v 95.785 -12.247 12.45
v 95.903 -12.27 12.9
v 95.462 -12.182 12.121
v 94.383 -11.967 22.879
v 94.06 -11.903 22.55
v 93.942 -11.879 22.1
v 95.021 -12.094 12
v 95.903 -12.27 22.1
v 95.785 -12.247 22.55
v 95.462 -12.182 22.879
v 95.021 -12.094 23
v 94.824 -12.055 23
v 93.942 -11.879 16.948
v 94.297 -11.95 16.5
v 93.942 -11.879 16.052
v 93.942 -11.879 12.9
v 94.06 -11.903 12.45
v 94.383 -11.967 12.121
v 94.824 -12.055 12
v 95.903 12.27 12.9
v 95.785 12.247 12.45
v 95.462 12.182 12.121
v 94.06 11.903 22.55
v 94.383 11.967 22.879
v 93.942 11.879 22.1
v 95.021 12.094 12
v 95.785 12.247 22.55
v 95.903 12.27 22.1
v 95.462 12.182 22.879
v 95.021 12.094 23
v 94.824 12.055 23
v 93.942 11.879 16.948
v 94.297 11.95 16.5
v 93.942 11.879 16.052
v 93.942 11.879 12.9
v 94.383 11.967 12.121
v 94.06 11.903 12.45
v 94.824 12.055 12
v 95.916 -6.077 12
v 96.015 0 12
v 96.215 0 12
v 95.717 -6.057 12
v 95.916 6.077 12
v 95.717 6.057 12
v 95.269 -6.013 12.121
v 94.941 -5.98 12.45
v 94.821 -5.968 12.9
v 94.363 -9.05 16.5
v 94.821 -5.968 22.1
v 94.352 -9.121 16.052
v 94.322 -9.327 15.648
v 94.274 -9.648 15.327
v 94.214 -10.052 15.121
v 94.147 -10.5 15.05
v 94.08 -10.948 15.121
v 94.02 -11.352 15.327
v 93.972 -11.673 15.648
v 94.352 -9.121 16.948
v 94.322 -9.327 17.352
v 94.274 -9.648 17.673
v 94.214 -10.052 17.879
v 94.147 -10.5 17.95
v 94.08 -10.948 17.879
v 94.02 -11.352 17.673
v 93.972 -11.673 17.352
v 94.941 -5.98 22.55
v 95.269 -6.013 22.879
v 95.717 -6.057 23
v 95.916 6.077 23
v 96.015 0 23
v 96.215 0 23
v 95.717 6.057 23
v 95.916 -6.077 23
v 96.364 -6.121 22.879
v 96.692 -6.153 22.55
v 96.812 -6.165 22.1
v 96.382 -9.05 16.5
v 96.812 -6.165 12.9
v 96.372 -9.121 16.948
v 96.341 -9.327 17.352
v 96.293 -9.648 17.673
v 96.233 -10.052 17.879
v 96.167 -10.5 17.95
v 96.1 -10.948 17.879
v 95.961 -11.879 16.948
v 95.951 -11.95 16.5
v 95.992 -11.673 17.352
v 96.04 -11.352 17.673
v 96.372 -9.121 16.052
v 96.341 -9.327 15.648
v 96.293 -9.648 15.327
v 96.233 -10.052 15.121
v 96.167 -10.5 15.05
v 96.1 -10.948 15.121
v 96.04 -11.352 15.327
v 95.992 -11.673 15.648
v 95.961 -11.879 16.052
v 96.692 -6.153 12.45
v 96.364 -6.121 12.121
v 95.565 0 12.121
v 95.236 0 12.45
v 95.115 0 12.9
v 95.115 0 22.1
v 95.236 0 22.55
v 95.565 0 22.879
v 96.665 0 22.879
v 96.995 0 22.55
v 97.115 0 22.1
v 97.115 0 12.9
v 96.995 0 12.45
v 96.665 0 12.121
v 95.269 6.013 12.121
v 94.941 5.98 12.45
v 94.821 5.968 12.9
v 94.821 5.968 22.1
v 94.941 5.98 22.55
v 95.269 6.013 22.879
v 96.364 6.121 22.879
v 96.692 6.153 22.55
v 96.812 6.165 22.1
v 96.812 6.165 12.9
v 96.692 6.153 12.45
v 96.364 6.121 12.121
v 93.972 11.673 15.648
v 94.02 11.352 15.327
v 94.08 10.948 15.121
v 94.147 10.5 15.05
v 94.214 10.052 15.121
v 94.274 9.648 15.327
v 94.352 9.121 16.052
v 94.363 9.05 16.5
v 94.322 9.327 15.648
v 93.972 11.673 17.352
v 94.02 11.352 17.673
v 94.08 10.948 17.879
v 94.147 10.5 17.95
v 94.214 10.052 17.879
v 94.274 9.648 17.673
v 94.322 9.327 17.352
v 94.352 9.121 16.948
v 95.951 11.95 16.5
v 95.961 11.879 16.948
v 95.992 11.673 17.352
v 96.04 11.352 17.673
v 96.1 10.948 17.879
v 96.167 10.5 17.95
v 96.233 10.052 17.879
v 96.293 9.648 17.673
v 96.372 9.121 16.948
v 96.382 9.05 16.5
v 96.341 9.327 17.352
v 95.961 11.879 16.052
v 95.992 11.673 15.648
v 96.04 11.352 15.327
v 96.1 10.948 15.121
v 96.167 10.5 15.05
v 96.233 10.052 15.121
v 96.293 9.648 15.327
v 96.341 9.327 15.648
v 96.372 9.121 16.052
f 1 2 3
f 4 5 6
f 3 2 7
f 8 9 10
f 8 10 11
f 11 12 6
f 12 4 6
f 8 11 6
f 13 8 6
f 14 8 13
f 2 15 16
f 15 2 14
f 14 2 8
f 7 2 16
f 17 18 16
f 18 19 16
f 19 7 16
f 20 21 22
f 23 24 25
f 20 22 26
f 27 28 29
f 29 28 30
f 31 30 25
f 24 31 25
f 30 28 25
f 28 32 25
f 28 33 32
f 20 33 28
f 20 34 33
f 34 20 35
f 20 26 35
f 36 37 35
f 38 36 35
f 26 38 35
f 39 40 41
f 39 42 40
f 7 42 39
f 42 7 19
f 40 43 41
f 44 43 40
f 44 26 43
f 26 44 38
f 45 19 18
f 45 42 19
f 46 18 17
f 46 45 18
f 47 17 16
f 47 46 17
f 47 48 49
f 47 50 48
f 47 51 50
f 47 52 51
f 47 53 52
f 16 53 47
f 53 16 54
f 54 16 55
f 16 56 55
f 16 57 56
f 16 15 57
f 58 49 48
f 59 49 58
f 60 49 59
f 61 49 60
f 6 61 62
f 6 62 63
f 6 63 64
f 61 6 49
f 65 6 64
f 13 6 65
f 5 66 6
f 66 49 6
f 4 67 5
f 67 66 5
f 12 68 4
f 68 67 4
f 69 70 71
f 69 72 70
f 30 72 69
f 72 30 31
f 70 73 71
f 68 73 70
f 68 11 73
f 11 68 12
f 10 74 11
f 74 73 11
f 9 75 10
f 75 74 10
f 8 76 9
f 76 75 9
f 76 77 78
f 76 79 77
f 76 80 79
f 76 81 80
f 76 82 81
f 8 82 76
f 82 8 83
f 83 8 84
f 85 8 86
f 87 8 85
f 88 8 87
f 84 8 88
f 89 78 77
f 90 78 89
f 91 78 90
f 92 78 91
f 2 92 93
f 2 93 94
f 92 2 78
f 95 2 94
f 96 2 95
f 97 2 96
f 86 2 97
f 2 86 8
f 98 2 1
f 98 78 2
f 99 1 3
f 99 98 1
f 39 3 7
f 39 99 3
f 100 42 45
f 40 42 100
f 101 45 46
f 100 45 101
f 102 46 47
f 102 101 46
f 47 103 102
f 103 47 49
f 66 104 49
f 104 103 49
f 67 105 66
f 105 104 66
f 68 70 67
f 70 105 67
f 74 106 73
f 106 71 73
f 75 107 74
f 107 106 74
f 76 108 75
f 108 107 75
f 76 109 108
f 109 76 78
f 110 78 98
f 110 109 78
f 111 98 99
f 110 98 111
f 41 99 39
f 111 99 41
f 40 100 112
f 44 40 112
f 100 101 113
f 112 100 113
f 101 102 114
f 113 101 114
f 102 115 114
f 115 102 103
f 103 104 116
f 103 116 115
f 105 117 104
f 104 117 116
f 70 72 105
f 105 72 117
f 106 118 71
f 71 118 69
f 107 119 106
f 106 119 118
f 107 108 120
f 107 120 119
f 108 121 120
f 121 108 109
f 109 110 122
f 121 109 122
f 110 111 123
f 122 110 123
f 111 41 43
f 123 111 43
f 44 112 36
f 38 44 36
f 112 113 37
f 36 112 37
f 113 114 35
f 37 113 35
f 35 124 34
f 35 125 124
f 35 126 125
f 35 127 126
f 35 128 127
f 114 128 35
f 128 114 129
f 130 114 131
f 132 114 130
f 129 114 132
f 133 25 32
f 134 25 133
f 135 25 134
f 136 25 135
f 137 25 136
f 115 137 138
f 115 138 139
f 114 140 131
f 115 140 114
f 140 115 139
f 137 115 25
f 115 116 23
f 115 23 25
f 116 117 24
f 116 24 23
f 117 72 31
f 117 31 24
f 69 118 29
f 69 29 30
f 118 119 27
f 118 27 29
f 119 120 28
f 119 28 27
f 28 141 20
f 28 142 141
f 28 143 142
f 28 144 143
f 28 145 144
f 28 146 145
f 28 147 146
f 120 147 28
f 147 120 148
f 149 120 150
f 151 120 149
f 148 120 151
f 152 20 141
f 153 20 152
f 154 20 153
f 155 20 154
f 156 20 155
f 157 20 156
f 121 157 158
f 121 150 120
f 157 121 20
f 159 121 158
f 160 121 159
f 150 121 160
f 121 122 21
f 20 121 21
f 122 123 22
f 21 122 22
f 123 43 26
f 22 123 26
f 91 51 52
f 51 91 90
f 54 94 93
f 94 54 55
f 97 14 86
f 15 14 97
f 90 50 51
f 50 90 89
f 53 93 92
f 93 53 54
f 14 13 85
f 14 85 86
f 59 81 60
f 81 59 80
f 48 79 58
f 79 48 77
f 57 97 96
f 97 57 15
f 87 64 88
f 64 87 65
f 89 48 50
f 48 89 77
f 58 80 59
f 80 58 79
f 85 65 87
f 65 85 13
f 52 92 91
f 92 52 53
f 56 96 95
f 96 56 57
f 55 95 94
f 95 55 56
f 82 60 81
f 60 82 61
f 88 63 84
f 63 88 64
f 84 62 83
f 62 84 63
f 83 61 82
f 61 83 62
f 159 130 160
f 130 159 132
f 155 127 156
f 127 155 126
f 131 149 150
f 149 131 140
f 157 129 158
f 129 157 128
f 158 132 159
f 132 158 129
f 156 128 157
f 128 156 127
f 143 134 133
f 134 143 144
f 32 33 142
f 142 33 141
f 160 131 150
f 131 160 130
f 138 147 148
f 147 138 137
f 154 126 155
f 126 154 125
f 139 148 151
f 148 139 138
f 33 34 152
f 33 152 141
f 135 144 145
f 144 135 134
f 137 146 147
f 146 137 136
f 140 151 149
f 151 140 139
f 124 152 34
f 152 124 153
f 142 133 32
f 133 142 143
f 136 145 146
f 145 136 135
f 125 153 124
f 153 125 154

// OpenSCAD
// H14_trigger_plate  (qty 1; frame: H; MJF PA12 or PETG)
// GENERATED by gen_halo_stl.py from halo_parts.py. Change numbers in halo_params.scad.
// Every dimension below is an expression of the names in halo_params.scad.
include <../halo_params.scad>

difference() {
    translate([X_NC, 0, 0]) {
        rotate([0, 0, -((13 / R_NB) * 57.29578)]) {
            rotate_extrude(angle = 2 * ((13 / R_NB) * 57.29578), $fn = 72) polygon([[R_NB - 3.3 - 0.9 + 0, BAND_Z_FRONT - 23 + 0.9 + -0.9], [R_NB - 3.3 - 0.9 + 0.45, BAND_Z_FRONT - 23 + 0.9 + -0.779423], [R_NB - 3.3 - 0.9 + 0.779423, BAND_Z_FRONT - 23 + 0.9 + -0.45], [R_NB - 3.3 - 0.9 + 0.9, BAND_Z_FRONT - 23 + 0.9 + 0], [R_NB - 3.3 - 0.9 + 0.9, BAND_Z_FRONT - 12 - 0.9 + 0], [R_NB - 3.3 - 0.9 + 0.779423, BAND_Z_FRONT - 12 - 0.9 + 0.45], [R_NB - 3.3 - 0.9 + 0.45, BAND_Z_FRONT - 12 - 0.9 + 0.779423], [R_NB - 3.3 - 0.9 + 0, BAND_Z_FRONT - 12 - 0.9 + 0.9], [R_NB - 5.3 + 0.9 + 0, BAND_Z_FRONT - 12 - 0.9 + 0.9], [R_NB - 5.3 + 0.9 + -0.45, BAND_Z_FRONT - 12 - 0.9 + 0.779423], [R_NB - 5.3 + 0.9 + -0.779423, BAND_Z_FRONT - 12 - 0.9 + 0.45], [R_NB - 5.3 + 0.9 + -0.9, BAND_Z_FRONT - 12 - 0.9 + 0], [R_NB - 5.3 + 0.9 + -0.9, BAND_Z_FRONT - 23 + 0.9 + 0], [R_NB - 5.3 + 0.9 + -0.779423, BAND_Z_FRONT - 23 + 0.9 + -0.45], [R_NB - 5.3 + 0.9 + -0.45, BAND_Z_FRONT - 23 + 0.9 + -0.779423], [R_NB - 5.3 + 0.9 + 0, BAND_Z_FRONT - 23 + 0.9 + -0.9]]);
        }
    }
    translate([X_NC + R_NB - 7, -10.5, BAND_Z_FRONT - 18.5]) {
        rotate([0, 90, 0]) {
            cylinder(h = 4, r = 1.45, center = false, $fn = 20);
        }
    }
    translate([X_NC + R_NB - 7, 10.5, BAND_Z_FRONT - 18.5]) {
        rotate([0, 90, 0]) {
            cylinder(h = 4, r = 1.45, center = false, $fn = 20);
        }
    }
}
